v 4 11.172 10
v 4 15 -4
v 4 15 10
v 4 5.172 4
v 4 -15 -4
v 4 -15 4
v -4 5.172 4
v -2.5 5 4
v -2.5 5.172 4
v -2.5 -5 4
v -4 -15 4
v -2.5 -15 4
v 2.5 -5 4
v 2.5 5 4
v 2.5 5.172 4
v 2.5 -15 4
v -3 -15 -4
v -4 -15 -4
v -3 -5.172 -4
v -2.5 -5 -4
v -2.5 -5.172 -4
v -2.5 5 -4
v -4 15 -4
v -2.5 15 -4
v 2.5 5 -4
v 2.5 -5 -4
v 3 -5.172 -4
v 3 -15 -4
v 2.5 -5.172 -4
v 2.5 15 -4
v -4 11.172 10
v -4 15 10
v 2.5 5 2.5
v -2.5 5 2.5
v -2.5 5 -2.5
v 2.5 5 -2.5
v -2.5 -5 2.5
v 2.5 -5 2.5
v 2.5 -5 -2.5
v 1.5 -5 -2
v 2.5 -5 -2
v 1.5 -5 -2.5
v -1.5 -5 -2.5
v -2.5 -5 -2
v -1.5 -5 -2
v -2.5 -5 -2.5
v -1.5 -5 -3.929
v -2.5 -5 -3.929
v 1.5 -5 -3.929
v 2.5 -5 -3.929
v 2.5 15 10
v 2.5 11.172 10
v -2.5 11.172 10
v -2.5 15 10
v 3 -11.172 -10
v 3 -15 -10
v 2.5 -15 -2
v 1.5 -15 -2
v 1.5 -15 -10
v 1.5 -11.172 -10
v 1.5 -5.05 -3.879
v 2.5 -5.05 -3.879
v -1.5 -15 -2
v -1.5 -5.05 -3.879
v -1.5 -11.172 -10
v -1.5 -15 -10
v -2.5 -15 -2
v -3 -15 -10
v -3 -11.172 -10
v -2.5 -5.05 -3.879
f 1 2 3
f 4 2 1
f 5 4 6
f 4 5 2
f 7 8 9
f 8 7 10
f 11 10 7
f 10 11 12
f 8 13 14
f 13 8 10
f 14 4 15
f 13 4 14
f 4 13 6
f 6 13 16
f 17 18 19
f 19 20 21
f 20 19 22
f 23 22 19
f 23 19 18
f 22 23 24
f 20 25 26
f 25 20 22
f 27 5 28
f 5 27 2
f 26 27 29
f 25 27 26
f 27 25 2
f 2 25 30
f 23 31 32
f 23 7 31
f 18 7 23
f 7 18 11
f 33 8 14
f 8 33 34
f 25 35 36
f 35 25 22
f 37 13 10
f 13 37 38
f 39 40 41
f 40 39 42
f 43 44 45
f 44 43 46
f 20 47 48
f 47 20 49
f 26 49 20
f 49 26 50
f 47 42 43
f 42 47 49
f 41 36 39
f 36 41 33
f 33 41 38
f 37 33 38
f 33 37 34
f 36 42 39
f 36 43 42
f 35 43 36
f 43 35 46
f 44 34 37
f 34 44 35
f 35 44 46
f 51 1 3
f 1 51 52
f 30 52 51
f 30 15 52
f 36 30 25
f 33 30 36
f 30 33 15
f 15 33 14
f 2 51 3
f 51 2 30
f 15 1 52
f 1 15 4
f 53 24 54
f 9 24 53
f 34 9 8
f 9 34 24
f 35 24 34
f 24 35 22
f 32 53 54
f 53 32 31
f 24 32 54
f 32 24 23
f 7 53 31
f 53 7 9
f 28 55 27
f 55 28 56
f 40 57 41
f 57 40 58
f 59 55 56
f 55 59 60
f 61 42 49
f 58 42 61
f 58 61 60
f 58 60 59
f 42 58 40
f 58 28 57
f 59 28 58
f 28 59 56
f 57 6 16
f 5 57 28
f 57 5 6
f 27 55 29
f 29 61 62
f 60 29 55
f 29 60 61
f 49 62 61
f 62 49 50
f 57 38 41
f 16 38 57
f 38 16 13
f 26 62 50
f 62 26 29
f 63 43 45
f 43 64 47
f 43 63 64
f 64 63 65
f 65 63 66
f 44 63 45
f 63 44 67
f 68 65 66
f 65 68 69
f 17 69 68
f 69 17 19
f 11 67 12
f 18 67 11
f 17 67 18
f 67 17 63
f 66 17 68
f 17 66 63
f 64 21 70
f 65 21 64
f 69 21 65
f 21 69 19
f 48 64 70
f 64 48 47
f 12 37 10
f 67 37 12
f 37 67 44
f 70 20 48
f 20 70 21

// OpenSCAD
link_length = 10;
link_outer_height = 8;
link_innner_height = 5;
link_outer_width = 8;
link_inner_width = 5;
wall_width = link_outer_width - link_inner_width;

flange_length = 10;

module core_flange() {
  cube([wall_width/2, flange_length, link_outer_height], center=true);
}

module male_flange() {
  core_flange();
  translate([0,0,link_outer_height-2]) {
    difference() {
      cube([wall_width/2, flange_length, link_outer_height], center=true);
      rotate([45,0,0])
        translate([0,0,link_outer_height-2])
          cube([wall_width/2, flange_length, link_outer_height], center=true);
    }
  }
}

module female_flange(inset=-1) {
  core_flange();
  translate([inset,0,-link_outer_height+2]) {
    difference() {
      cube([wall_width/2, flange_length, link_outer_height], center=true);
      rotate([45,0,0])
          translate([0,0,-link_outer_height+2])
            cube([wall_width/2, flange_length, link_outer_height], center=true);
    }
  }
}

module flanges() {
  translate([(wall_width)+0.25,(link_length/2)+flange_length/2,0]) male_flange();
  translate([-(wall_width)-0.25,(link_length/2)+flange_length/2,0]) male_flange();
  translate([(wall_width)+0.25,-(link_length/2)-flange_length/2,0]) female_flange(-1);
  translate([-(wall_width)-0.25,-(link_length/2)-flange_length/2,0]) female_flange(1);
}

difference() {
  cube([link_outer_height,link_length,link_outer_width], center=true);
  cube([link_innner_height,link_length,link_inner_width], center=true);
}
flanges();
